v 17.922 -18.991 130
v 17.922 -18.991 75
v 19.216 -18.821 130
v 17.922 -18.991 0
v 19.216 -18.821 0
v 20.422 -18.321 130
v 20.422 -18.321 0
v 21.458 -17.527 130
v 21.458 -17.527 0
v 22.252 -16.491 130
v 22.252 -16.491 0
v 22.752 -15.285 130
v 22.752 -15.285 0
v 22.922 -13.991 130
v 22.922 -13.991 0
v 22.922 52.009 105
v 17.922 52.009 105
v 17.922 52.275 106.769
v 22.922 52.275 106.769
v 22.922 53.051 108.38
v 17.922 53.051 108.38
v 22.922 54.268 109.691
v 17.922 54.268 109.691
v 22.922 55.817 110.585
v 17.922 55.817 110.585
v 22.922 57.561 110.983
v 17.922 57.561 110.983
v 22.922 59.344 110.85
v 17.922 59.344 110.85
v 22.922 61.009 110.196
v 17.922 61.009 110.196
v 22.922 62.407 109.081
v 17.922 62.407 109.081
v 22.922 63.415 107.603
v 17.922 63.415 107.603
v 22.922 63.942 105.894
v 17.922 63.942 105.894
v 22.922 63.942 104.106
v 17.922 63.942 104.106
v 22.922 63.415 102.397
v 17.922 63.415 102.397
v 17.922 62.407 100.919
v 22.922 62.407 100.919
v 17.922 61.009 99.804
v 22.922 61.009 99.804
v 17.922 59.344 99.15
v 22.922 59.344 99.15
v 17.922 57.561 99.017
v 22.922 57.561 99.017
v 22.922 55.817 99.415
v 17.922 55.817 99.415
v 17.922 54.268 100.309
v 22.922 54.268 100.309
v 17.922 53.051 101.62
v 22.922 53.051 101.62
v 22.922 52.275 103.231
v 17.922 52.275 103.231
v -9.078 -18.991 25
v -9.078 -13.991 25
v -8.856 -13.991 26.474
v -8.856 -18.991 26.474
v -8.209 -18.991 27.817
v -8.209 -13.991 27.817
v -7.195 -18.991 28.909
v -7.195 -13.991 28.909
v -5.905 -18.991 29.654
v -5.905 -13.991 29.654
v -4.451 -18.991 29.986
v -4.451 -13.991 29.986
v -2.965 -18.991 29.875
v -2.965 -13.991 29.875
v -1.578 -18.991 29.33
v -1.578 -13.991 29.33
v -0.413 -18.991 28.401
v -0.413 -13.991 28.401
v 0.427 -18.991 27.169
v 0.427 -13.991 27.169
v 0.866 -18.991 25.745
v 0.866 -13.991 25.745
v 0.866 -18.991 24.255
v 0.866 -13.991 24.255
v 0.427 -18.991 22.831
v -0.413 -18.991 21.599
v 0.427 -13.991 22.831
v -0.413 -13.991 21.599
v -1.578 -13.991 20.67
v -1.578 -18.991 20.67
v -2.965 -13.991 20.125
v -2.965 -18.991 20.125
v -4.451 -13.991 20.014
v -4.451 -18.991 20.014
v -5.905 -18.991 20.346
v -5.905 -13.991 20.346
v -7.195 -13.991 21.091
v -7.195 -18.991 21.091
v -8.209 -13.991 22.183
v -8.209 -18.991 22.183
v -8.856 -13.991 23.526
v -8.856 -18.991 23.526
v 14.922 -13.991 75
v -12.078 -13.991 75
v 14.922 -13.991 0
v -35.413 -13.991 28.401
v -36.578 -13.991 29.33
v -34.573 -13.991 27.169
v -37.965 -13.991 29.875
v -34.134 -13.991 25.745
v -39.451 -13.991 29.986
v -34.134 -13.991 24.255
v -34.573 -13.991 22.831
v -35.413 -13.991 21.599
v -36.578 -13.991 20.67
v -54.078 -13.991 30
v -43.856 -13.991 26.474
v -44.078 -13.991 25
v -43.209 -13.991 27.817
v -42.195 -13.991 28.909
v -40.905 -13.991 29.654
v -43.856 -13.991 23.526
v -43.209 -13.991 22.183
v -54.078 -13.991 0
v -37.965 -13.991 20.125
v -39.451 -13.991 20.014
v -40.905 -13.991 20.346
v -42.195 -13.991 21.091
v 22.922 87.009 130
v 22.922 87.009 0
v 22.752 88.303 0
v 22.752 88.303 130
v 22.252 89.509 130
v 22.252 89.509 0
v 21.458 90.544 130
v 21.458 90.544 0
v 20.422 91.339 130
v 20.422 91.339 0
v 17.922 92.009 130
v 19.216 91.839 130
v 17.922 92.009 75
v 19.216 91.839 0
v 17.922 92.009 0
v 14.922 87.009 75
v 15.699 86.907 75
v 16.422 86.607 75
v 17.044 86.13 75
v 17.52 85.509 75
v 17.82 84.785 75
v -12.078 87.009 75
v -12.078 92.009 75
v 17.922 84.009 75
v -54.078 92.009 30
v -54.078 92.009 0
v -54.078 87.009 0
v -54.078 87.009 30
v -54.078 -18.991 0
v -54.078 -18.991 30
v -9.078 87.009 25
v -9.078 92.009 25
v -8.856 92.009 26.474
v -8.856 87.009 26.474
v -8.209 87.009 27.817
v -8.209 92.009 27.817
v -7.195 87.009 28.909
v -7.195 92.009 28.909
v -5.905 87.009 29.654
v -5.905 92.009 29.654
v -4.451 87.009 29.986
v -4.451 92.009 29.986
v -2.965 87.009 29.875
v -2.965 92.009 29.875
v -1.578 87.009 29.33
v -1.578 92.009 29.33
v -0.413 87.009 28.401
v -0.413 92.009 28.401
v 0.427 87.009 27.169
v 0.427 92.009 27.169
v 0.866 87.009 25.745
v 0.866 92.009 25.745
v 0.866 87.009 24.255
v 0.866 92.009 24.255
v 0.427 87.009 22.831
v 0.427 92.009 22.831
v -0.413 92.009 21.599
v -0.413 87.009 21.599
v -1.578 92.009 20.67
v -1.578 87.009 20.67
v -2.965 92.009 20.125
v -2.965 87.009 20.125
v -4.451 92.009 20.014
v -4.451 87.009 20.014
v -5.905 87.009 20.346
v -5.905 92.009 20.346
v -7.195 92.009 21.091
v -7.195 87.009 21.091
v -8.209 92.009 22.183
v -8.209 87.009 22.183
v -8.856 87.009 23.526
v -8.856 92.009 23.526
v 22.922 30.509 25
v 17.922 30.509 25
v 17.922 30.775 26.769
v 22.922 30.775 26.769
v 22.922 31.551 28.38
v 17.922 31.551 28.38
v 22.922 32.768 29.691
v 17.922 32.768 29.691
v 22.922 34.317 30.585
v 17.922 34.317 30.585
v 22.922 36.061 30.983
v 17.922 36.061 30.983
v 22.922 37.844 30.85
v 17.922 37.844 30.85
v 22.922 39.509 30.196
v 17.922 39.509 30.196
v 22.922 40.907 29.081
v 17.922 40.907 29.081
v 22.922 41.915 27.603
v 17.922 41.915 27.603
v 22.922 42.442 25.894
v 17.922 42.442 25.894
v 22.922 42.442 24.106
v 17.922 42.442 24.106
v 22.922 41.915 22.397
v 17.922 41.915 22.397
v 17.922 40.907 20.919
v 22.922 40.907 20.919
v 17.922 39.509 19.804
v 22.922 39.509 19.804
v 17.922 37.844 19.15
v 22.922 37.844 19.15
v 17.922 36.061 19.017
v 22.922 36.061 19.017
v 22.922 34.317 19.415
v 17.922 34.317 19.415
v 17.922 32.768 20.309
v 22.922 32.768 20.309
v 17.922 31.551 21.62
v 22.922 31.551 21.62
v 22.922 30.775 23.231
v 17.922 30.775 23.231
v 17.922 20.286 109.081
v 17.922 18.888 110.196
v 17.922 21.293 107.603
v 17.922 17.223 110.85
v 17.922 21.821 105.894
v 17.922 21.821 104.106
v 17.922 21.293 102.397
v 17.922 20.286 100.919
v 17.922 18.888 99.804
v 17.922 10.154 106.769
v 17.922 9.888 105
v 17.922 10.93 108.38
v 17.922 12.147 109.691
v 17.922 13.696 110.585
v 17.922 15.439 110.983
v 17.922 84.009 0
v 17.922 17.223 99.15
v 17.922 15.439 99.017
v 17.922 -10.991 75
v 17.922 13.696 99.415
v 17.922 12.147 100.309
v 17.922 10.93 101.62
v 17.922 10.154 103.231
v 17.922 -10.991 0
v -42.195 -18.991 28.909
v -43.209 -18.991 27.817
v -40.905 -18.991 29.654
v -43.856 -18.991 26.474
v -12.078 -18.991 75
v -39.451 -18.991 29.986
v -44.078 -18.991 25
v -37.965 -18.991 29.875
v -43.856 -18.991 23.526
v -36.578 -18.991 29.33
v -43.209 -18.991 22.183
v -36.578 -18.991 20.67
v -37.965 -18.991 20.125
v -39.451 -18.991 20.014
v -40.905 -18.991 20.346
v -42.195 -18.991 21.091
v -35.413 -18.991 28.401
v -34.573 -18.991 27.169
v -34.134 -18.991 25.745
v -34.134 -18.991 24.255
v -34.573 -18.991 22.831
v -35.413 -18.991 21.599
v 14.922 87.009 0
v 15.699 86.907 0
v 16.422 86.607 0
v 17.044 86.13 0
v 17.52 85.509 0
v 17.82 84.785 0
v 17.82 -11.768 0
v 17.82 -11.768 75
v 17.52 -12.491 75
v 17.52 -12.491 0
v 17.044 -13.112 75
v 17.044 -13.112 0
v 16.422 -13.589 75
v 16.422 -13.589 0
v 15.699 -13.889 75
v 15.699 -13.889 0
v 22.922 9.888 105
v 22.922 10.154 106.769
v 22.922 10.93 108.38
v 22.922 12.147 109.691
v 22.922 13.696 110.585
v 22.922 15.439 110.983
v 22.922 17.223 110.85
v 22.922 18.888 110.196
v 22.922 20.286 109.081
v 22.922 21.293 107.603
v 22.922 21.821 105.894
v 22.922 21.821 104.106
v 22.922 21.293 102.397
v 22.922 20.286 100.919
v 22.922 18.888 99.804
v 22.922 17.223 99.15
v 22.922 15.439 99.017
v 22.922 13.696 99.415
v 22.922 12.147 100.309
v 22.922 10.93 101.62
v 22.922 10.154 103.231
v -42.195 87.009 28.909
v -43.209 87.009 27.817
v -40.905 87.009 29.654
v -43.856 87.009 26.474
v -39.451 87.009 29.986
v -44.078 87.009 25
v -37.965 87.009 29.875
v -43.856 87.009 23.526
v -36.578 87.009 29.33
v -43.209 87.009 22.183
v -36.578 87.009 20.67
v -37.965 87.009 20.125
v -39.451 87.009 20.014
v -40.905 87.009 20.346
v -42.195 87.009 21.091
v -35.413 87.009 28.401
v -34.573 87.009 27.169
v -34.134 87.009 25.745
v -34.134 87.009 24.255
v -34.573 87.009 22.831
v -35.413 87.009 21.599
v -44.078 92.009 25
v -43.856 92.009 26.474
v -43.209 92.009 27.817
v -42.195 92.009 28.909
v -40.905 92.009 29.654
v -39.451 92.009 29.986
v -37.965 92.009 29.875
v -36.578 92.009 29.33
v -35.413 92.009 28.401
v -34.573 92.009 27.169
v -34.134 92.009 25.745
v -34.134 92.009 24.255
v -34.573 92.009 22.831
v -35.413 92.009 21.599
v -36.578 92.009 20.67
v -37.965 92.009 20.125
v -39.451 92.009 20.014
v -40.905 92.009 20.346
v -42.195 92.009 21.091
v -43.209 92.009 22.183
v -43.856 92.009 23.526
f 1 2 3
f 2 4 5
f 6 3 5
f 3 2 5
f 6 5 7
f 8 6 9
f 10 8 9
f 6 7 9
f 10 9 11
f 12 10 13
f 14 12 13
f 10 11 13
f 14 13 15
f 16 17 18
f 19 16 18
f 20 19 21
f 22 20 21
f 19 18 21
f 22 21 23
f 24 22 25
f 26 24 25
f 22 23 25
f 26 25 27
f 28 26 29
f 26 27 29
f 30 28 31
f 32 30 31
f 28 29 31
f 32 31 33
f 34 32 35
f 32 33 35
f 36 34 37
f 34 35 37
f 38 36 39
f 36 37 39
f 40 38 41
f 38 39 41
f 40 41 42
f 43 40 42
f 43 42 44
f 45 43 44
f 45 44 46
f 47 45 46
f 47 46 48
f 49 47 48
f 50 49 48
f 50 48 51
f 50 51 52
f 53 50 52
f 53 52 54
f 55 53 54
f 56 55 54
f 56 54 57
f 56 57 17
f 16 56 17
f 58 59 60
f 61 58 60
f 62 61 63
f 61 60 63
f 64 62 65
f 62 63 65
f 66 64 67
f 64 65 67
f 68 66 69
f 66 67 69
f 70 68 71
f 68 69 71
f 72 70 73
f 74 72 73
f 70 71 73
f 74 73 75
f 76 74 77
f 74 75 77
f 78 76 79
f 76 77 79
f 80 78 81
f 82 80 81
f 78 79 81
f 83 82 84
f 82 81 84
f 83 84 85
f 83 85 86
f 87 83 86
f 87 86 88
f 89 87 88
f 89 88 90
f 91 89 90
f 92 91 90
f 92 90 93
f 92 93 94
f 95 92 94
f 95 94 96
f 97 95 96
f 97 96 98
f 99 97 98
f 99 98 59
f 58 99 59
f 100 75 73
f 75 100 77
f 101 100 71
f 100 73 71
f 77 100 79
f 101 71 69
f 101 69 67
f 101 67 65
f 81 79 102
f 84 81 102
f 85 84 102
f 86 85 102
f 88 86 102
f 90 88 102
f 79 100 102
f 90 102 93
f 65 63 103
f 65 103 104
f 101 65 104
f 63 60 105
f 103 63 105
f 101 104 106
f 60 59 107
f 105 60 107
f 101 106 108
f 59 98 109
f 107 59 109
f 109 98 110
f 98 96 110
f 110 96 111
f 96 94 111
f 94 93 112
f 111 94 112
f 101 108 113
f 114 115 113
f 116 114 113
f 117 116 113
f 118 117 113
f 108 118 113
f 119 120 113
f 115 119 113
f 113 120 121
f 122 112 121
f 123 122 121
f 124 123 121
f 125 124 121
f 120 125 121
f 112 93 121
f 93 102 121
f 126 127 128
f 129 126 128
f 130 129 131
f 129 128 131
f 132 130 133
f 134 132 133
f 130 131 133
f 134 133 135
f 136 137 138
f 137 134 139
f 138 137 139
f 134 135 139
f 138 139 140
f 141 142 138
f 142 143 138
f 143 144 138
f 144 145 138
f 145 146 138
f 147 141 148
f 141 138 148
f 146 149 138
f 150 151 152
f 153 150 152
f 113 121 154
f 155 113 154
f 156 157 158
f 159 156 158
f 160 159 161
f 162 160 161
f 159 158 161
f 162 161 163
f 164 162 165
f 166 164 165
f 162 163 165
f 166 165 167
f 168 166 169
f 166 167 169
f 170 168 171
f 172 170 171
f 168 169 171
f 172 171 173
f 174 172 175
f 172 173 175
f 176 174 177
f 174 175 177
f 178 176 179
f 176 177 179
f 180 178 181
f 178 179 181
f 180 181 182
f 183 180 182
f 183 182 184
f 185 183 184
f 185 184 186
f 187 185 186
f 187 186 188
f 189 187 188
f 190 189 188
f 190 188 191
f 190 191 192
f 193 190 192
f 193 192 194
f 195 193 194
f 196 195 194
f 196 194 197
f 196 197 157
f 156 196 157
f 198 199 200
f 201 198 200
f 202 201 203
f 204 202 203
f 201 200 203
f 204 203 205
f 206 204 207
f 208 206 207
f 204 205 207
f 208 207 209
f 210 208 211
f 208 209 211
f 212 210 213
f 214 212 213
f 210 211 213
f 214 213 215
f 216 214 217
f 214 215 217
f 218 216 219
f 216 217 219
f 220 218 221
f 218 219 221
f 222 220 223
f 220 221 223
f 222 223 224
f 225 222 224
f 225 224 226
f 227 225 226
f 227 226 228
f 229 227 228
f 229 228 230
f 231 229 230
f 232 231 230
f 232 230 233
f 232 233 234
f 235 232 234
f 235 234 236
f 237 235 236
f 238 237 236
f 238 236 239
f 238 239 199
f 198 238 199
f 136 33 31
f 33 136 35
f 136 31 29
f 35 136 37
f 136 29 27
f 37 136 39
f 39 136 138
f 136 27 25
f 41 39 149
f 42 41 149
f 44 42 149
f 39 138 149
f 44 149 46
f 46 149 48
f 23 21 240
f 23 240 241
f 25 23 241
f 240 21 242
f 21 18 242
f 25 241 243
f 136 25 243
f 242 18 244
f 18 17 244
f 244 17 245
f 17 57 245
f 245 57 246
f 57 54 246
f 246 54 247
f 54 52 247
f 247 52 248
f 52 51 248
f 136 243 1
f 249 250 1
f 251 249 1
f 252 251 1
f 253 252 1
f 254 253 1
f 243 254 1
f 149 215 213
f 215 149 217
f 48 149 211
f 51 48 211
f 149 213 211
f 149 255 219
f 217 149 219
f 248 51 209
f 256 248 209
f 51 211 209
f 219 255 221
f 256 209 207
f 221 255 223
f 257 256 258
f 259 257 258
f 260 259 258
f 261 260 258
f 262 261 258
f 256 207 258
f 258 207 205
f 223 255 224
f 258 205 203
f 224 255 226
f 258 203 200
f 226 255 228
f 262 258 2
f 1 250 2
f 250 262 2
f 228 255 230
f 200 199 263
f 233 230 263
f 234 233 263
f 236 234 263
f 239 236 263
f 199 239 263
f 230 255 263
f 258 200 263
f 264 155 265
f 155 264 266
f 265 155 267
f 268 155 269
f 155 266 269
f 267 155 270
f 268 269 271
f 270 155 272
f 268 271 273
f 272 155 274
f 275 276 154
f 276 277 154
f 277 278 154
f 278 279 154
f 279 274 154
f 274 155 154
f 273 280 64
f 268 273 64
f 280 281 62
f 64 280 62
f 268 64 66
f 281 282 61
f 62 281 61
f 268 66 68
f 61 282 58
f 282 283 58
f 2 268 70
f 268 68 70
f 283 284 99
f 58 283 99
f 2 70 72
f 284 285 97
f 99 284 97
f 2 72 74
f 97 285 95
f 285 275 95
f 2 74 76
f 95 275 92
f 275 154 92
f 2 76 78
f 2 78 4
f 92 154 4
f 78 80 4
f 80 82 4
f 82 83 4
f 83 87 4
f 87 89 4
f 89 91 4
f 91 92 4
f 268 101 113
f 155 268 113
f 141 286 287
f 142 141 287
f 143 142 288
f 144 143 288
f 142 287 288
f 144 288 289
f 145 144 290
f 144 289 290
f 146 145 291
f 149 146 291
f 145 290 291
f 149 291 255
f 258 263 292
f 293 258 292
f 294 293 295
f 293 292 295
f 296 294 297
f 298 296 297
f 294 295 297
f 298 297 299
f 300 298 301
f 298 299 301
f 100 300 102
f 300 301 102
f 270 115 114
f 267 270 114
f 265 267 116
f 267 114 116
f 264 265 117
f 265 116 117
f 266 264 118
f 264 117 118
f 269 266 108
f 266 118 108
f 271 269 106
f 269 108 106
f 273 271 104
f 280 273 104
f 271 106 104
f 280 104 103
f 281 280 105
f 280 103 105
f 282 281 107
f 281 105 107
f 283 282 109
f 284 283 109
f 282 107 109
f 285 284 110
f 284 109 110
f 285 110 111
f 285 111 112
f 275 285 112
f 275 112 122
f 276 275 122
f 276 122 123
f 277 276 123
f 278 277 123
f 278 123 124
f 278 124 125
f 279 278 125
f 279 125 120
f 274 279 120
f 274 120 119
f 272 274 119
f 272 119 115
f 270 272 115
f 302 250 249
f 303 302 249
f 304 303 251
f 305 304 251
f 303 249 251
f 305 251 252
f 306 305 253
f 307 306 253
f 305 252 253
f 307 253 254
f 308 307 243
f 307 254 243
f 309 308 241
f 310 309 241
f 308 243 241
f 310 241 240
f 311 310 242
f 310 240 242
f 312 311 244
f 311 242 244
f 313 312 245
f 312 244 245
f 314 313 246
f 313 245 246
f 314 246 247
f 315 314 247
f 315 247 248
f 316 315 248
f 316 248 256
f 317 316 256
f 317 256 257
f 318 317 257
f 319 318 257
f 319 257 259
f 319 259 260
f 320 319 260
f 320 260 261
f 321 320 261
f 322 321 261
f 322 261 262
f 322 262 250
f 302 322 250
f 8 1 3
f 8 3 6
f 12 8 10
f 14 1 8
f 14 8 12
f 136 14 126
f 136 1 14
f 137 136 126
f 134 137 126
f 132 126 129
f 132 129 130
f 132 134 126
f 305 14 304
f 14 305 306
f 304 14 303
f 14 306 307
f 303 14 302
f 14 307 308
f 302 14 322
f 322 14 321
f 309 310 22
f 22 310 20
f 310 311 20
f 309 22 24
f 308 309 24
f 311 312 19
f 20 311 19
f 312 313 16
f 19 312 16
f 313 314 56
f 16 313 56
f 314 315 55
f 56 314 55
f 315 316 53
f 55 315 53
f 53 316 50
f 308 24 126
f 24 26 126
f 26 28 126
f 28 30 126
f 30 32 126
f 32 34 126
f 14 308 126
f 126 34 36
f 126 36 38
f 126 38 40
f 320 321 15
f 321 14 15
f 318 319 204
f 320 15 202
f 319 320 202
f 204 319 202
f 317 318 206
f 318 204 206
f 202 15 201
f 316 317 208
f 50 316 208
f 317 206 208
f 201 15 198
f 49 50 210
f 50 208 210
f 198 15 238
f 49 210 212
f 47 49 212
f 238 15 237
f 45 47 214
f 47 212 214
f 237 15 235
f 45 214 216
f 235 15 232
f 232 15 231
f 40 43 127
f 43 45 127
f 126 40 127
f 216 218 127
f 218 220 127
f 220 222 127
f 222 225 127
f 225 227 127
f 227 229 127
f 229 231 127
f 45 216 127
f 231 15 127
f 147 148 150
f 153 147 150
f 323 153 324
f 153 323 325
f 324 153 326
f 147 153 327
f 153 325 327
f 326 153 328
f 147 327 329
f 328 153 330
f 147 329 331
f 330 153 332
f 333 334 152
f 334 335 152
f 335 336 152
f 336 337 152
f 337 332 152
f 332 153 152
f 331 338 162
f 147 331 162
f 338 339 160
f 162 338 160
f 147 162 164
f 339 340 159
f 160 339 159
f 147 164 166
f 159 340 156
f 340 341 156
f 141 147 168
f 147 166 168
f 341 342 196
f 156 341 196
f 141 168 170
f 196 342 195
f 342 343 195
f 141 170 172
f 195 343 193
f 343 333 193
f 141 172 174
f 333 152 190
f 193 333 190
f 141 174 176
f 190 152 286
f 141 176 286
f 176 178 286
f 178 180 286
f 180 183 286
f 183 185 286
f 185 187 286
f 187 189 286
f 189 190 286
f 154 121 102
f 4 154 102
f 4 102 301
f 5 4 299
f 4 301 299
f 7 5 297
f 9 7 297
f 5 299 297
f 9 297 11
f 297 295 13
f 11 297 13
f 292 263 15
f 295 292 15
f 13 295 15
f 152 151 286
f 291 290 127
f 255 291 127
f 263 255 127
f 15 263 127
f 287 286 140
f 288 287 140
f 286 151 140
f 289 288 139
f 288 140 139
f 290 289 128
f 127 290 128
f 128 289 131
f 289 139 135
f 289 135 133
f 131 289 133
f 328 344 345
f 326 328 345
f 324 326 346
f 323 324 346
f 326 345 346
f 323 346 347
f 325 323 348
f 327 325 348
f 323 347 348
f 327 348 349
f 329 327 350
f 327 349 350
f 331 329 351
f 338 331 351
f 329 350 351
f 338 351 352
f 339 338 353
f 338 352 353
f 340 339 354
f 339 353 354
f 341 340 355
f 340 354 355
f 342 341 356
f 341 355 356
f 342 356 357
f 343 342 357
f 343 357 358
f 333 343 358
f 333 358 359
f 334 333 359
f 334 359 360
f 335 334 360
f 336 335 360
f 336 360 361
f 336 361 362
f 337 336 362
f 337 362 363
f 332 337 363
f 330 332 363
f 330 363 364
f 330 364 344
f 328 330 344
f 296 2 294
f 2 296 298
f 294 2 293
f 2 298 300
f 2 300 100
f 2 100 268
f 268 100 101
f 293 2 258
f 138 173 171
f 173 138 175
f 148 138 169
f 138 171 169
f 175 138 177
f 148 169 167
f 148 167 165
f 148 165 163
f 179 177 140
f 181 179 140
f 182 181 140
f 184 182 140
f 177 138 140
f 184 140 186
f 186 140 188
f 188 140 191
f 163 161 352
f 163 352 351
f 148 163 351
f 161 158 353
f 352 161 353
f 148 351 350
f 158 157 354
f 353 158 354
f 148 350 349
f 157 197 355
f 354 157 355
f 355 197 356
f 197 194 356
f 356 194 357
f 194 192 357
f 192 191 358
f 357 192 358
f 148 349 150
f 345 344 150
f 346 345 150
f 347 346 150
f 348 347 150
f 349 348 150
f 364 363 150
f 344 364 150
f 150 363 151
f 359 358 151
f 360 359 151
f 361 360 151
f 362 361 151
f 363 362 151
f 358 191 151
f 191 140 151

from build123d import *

# Parameters (mm, degrees)
F1_DEPTH = 130
F2_R     = 6
F3_DEPTH = 5.001
F4_R     = 5
F5_DEPTH = 111.001


with BuildPart() as f1:
    # F0 (on Top) → F1 (new body)
    with BuildSketch(Plane.XY):
        with BuildLine():
            Line((17.922193, 92.008901), (-54.077807, 92.008901))
            Line((-54.077807, 92.008901), (-54.077807, 87.008901))
            Line((-54.077807, 87.008901), (14.922193, 87.008901))
            ThreePointArc((14.922193, 87.008901), (17.043514, 86.130221), (17.922193, 84.008901))
            Line((17.922193, 84.008901), (17.922193, -10.991095))
            ThreePointArc((17.922193, -10.991095), (17.043514, -13.112415), (14.922193, -13.991095))
            Line((14.922193, -13.991095), (-54.077807, -13.991095))
            Line((-54.077807, -13.991095), (-54.077807, -18.991099))
            Line((-54.077807, -18.991099), (17.922193, -18.991099))
            ThreePointArc((17.922193, -18.991099), (21.457727, -17.526633), (22.922193, -13.991099))
            Line((22.922193, -13.991099), (22.922193, 87.008901))
            ThreePointArc((22.922193, 87.008901), (21.457727, 90.544435), (17.922193, 92.008901))
        make_face()
    extrude(amount=F1_DEPTH)

    # F2 (on face) → F3 (cut, through all)
    with BuildSketch(Plane(origin=(17.922193, 0, 0), x_dir=(0, -1, 0), z_dir=(-1, 0, 0))):
        with Locations((-15.887585, 105)):
            Circle(F2_R)
        with Locations((-36.508901, 25)):
            Circle(F2_R)
        with Locations((-58.008901, 105)):
            Circle(F2_R)
    extrude(amount=-F3_DEPTH, mode=Mode.SUBTRACT)

    # F4 (on face) → F5 (cut, through all)
    with BuildSketch(Plane(origin=(0, 92.008901, 0), x_dir=(-1, 0, 0), z_dir=(0, 1, 0))):
        with Locations((39.077807, 25)):
            Circle(F4_R)
        with Locations((4.077807, 25)):
            Circle(F4_R)
        Polygon((12.077807, 75), (54.077807, 30), (54.077807, 130), (-17.922193, 130), (-17.922193, 75), align=None)
    extrude(amount=-F5_DEPTH, mode=Mode.SUBTRACT)


solid = f1.part
